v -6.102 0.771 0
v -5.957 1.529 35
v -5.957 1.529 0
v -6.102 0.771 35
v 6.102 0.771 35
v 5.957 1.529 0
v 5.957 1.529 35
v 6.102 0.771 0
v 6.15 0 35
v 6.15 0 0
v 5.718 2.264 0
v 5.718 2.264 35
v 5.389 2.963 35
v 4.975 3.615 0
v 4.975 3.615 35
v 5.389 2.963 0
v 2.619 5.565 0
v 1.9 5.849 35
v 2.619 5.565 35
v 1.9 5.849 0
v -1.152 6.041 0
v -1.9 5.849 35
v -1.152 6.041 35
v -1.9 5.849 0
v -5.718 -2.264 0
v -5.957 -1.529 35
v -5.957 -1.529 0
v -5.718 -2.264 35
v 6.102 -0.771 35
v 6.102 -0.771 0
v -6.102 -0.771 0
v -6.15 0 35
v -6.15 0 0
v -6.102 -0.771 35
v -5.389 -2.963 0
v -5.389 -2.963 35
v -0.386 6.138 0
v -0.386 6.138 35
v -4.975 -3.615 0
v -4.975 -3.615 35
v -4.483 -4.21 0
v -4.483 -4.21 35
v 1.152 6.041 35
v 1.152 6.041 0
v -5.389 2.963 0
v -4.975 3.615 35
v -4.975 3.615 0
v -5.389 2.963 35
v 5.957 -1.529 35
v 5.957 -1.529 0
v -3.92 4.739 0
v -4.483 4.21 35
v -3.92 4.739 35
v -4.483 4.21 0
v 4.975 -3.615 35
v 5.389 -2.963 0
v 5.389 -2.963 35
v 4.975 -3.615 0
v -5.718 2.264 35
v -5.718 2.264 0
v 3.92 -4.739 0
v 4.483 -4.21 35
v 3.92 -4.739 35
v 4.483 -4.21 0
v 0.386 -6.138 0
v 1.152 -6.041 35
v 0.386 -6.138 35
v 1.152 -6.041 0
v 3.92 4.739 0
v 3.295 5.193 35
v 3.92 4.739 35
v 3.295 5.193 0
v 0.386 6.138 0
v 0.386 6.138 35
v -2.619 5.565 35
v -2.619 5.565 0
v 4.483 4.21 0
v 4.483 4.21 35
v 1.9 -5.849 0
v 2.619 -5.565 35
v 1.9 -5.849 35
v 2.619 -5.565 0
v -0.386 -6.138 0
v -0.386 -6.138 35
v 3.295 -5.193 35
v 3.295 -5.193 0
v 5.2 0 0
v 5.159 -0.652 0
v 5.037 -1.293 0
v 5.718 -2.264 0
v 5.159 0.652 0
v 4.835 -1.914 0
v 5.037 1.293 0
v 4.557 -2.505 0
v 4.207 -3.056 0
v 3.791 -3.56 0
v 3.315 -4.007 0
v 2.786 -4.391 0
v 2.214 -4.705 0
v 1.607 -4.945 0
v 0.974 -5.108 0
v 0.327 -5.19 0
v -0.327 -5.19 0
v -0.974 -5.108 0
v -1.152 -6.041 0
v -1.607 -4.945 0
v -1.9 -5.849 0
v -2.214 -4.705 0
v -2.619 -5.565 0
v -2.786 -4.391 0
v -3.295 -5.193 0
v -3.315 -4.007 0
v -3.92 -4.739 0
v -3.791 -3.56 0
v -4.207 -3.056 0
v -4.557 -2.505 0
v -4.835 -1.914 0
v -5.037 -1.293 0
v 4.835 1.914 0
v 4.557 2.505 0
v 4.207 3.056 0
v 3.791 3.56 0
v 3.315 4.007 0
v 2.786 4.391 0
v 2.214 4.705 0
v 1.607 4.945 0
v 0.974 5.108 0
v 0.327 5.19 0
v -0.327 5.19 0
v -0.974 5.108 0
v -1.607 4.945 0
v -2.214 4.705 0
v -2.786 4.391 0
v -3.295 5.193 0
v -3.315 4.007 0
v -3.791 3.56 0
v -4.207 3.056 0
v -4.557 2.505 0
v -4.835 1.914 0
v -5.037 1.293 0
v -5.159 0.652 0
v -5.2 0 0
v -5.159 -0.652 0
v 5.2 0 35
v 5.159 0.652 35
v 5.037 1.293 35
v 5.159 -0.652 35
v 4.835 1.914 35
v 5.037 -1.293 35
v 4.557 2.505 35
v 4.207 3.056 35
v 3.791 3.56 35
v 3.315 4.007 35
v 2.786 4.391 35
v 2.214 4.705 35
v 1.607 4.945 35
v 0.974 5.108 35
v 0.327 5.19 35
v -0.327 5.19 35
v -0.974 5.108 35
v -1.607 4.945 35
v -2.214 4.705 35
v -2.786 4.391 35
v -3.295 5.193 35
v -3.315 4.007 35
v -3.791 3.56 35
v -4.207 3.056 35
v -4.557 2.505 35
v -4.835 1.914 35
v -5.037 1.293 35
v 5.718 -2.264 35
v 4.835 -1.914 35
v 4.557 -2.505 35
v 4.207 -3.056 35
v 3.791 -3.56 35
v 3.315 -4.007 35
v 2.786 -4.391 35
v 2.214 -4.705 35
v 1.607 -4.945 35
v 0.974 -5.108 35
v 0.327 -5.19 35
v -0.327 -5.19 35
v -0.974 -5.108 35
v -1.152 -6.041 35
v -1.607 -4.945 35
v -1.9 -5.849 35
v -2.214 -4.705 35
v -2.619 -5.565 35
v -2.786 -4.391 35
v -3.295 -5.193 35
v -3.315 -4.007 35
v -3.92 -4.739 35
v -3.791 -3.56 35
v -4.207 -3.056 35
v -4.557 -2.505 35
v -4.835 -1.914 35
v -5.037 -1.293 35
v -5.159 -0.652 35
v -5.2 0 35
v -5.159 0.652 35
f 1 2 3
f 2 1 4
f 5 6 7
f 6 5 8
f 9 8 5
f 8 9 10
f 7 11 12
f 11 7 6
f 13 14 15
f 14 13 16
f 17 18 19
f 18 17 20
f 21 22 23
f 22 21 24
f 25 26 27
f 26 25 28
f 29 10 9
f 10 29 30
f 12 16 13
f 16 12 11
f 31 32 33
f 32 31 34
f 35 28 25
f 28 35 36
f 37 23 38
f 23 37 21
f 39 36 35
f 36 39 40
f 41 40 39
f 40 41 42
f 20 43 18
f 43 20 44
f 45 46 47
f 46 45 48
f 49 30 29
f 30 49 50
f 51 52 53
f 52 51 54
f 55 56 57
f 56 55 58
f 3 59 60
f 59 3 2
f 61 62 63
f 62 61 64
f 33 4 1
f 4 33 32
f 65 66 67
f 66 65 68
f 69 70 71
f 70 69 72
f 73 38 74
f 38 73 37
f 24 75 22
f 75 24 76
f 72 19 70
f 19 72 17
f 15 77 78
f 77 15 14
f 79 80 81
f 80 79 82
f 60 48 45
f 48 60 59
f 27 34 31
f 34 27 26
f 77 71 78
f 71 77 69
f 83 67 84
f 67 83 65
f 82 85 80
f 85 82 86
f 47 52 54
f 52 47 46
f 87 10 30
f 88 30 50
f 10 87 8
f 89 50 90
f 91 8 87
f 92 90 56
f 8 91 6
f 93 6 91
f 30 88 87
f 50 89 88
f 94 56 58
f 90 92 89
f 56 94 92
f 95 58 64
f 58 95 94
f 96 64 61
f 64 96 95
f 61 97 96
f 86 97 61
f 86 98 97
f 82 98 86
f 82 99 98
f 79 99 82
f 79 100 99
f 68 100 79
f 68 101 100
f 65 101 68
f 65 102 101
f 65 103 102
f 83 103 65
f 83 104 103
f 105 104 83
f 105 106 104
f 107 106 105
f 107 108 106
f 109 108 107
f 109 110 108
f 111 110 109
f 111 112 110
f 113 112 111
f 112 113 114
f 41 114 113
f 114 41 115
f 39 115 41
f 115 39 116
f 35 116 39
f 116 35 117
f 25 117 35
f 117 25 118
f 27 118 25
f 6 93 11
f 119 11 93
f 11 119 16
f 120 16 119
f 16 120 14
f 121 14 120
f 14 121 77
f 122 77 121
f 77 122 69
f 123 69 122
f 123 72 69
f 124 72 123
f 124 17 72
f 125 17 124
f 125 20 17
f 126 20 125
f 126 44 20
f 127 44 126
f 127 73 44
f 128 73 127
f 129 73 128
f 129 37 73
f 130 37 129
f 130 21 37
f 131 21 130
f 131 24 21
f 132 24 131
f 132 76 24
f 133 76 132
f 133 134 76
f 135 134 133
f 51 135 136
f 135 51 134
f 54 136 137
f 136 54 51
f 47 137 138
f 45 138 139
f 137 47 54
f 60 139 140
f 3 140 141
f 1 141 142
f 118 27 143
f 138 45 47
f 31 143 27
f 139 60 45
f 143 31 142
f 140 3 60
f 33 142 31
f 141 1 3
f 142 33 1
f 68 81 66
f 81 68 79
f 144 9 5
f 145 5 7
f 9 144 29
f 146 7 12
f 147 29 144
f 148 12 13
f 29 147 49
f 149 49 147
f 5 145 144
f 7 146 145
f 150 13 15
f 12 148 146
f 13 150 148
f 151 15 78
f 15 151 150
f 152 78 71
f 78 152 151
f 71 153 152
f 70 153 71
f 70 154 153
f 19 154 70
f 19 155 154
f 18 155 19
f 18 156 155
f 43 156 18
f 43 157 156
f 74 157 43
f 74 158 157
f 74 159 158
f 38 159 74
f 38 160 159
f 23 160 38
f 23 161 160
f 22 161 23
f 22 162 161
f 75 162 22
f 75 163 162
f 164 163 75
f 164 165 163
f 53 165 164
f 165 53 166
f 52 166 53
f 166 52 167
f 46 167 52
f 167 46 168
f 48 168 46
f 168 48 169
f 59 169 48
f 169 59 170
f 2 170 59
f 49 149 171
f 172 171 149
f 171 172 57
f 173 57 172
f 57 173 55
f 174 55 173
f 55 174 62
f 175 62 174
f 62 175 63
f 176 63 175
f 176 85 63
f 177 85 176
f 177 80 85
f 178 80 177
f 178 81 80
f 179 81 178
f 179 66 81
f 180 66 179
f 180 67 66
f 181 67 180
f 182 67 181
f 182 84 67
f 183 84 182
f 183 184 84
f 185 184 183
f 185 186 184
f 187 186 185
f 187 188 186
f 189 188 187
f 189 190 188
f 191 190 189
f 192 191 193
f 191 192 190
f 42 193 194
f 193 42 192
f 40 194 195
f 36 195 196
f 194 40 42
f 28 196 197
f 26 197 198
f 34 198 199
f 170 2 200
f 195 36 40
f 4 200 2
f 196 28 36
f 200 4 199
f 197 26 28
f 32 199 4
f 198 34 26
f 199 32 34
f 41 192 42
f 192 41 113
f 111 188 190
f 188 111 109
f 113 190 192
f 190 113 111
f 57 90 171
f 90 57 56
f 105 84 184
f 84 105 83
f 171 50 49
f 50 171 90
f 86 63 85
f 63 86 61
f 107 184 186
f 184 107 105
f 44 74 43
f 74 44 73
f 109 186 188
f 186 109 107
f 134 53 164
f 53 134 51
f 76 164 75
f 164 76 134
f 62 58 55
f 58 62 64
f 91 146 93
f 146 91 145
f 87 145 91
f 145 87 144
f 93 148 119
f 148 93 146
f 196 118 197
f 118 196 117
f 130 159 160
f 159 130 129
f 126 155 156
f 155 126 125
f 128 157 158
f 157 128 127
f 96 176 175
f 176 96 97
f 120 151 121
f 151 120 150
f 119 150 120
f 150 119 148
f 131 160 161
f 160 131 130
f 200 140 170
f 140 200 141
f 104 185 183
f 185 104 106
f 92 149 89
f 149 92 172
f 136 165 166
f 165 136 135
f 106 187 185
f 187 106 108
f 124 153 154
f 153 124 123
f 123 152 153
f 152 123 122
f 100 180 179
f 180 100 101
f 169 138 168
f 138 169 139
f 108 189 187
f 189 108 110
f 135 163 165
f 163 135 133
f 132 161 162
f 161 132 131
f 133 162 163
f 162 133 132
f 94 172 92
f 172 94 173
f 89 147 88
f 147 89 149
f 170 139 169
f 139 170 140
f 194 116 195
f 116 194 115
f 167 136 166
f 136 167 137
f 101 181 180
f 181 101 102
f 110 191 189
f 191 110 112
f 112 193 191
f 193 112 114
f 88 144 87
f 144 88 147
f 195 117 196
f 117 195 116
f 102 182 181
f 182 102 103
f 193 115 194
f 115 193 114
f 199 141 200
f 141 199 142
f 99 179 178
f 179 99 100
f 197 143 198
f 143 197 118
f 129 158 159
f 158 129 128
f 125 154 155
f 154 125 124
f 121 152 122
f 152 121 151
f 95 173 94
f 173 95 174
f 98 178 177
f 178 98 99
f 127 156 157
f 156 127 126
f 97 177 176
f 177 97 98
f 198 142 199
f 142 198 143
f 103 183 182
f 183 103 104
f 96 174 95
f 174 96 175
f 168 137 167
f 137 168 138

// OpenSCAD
  difference()
      { 
     rotate([0,0,0])
       translate([0,0,0])
          //inside cylinder
      cylinder(r=6.15,h=35, $fn=50); 
      
      //малый диаметр
      rotate([0,0,0])
       translate([0,0,-1])
          //inside cylinder
     cylinder(r=5.2,h=37, $fn=50);     
          
          //нижняя обрезка
  //    rotate([0,0,0])
    //   translate([0,0,-0.1])
          //inside cylinder
     // cylinder(r=5.2,h=15.2, $fn=50);   
        
        //верхняя обрезка
   //   rotate([0,0,0])
   //    translate([0,0,19.9])
          //inside cylinder
  //    cylinder(r=5.2,h=15.2, $fn=50);      
          
          
      }
